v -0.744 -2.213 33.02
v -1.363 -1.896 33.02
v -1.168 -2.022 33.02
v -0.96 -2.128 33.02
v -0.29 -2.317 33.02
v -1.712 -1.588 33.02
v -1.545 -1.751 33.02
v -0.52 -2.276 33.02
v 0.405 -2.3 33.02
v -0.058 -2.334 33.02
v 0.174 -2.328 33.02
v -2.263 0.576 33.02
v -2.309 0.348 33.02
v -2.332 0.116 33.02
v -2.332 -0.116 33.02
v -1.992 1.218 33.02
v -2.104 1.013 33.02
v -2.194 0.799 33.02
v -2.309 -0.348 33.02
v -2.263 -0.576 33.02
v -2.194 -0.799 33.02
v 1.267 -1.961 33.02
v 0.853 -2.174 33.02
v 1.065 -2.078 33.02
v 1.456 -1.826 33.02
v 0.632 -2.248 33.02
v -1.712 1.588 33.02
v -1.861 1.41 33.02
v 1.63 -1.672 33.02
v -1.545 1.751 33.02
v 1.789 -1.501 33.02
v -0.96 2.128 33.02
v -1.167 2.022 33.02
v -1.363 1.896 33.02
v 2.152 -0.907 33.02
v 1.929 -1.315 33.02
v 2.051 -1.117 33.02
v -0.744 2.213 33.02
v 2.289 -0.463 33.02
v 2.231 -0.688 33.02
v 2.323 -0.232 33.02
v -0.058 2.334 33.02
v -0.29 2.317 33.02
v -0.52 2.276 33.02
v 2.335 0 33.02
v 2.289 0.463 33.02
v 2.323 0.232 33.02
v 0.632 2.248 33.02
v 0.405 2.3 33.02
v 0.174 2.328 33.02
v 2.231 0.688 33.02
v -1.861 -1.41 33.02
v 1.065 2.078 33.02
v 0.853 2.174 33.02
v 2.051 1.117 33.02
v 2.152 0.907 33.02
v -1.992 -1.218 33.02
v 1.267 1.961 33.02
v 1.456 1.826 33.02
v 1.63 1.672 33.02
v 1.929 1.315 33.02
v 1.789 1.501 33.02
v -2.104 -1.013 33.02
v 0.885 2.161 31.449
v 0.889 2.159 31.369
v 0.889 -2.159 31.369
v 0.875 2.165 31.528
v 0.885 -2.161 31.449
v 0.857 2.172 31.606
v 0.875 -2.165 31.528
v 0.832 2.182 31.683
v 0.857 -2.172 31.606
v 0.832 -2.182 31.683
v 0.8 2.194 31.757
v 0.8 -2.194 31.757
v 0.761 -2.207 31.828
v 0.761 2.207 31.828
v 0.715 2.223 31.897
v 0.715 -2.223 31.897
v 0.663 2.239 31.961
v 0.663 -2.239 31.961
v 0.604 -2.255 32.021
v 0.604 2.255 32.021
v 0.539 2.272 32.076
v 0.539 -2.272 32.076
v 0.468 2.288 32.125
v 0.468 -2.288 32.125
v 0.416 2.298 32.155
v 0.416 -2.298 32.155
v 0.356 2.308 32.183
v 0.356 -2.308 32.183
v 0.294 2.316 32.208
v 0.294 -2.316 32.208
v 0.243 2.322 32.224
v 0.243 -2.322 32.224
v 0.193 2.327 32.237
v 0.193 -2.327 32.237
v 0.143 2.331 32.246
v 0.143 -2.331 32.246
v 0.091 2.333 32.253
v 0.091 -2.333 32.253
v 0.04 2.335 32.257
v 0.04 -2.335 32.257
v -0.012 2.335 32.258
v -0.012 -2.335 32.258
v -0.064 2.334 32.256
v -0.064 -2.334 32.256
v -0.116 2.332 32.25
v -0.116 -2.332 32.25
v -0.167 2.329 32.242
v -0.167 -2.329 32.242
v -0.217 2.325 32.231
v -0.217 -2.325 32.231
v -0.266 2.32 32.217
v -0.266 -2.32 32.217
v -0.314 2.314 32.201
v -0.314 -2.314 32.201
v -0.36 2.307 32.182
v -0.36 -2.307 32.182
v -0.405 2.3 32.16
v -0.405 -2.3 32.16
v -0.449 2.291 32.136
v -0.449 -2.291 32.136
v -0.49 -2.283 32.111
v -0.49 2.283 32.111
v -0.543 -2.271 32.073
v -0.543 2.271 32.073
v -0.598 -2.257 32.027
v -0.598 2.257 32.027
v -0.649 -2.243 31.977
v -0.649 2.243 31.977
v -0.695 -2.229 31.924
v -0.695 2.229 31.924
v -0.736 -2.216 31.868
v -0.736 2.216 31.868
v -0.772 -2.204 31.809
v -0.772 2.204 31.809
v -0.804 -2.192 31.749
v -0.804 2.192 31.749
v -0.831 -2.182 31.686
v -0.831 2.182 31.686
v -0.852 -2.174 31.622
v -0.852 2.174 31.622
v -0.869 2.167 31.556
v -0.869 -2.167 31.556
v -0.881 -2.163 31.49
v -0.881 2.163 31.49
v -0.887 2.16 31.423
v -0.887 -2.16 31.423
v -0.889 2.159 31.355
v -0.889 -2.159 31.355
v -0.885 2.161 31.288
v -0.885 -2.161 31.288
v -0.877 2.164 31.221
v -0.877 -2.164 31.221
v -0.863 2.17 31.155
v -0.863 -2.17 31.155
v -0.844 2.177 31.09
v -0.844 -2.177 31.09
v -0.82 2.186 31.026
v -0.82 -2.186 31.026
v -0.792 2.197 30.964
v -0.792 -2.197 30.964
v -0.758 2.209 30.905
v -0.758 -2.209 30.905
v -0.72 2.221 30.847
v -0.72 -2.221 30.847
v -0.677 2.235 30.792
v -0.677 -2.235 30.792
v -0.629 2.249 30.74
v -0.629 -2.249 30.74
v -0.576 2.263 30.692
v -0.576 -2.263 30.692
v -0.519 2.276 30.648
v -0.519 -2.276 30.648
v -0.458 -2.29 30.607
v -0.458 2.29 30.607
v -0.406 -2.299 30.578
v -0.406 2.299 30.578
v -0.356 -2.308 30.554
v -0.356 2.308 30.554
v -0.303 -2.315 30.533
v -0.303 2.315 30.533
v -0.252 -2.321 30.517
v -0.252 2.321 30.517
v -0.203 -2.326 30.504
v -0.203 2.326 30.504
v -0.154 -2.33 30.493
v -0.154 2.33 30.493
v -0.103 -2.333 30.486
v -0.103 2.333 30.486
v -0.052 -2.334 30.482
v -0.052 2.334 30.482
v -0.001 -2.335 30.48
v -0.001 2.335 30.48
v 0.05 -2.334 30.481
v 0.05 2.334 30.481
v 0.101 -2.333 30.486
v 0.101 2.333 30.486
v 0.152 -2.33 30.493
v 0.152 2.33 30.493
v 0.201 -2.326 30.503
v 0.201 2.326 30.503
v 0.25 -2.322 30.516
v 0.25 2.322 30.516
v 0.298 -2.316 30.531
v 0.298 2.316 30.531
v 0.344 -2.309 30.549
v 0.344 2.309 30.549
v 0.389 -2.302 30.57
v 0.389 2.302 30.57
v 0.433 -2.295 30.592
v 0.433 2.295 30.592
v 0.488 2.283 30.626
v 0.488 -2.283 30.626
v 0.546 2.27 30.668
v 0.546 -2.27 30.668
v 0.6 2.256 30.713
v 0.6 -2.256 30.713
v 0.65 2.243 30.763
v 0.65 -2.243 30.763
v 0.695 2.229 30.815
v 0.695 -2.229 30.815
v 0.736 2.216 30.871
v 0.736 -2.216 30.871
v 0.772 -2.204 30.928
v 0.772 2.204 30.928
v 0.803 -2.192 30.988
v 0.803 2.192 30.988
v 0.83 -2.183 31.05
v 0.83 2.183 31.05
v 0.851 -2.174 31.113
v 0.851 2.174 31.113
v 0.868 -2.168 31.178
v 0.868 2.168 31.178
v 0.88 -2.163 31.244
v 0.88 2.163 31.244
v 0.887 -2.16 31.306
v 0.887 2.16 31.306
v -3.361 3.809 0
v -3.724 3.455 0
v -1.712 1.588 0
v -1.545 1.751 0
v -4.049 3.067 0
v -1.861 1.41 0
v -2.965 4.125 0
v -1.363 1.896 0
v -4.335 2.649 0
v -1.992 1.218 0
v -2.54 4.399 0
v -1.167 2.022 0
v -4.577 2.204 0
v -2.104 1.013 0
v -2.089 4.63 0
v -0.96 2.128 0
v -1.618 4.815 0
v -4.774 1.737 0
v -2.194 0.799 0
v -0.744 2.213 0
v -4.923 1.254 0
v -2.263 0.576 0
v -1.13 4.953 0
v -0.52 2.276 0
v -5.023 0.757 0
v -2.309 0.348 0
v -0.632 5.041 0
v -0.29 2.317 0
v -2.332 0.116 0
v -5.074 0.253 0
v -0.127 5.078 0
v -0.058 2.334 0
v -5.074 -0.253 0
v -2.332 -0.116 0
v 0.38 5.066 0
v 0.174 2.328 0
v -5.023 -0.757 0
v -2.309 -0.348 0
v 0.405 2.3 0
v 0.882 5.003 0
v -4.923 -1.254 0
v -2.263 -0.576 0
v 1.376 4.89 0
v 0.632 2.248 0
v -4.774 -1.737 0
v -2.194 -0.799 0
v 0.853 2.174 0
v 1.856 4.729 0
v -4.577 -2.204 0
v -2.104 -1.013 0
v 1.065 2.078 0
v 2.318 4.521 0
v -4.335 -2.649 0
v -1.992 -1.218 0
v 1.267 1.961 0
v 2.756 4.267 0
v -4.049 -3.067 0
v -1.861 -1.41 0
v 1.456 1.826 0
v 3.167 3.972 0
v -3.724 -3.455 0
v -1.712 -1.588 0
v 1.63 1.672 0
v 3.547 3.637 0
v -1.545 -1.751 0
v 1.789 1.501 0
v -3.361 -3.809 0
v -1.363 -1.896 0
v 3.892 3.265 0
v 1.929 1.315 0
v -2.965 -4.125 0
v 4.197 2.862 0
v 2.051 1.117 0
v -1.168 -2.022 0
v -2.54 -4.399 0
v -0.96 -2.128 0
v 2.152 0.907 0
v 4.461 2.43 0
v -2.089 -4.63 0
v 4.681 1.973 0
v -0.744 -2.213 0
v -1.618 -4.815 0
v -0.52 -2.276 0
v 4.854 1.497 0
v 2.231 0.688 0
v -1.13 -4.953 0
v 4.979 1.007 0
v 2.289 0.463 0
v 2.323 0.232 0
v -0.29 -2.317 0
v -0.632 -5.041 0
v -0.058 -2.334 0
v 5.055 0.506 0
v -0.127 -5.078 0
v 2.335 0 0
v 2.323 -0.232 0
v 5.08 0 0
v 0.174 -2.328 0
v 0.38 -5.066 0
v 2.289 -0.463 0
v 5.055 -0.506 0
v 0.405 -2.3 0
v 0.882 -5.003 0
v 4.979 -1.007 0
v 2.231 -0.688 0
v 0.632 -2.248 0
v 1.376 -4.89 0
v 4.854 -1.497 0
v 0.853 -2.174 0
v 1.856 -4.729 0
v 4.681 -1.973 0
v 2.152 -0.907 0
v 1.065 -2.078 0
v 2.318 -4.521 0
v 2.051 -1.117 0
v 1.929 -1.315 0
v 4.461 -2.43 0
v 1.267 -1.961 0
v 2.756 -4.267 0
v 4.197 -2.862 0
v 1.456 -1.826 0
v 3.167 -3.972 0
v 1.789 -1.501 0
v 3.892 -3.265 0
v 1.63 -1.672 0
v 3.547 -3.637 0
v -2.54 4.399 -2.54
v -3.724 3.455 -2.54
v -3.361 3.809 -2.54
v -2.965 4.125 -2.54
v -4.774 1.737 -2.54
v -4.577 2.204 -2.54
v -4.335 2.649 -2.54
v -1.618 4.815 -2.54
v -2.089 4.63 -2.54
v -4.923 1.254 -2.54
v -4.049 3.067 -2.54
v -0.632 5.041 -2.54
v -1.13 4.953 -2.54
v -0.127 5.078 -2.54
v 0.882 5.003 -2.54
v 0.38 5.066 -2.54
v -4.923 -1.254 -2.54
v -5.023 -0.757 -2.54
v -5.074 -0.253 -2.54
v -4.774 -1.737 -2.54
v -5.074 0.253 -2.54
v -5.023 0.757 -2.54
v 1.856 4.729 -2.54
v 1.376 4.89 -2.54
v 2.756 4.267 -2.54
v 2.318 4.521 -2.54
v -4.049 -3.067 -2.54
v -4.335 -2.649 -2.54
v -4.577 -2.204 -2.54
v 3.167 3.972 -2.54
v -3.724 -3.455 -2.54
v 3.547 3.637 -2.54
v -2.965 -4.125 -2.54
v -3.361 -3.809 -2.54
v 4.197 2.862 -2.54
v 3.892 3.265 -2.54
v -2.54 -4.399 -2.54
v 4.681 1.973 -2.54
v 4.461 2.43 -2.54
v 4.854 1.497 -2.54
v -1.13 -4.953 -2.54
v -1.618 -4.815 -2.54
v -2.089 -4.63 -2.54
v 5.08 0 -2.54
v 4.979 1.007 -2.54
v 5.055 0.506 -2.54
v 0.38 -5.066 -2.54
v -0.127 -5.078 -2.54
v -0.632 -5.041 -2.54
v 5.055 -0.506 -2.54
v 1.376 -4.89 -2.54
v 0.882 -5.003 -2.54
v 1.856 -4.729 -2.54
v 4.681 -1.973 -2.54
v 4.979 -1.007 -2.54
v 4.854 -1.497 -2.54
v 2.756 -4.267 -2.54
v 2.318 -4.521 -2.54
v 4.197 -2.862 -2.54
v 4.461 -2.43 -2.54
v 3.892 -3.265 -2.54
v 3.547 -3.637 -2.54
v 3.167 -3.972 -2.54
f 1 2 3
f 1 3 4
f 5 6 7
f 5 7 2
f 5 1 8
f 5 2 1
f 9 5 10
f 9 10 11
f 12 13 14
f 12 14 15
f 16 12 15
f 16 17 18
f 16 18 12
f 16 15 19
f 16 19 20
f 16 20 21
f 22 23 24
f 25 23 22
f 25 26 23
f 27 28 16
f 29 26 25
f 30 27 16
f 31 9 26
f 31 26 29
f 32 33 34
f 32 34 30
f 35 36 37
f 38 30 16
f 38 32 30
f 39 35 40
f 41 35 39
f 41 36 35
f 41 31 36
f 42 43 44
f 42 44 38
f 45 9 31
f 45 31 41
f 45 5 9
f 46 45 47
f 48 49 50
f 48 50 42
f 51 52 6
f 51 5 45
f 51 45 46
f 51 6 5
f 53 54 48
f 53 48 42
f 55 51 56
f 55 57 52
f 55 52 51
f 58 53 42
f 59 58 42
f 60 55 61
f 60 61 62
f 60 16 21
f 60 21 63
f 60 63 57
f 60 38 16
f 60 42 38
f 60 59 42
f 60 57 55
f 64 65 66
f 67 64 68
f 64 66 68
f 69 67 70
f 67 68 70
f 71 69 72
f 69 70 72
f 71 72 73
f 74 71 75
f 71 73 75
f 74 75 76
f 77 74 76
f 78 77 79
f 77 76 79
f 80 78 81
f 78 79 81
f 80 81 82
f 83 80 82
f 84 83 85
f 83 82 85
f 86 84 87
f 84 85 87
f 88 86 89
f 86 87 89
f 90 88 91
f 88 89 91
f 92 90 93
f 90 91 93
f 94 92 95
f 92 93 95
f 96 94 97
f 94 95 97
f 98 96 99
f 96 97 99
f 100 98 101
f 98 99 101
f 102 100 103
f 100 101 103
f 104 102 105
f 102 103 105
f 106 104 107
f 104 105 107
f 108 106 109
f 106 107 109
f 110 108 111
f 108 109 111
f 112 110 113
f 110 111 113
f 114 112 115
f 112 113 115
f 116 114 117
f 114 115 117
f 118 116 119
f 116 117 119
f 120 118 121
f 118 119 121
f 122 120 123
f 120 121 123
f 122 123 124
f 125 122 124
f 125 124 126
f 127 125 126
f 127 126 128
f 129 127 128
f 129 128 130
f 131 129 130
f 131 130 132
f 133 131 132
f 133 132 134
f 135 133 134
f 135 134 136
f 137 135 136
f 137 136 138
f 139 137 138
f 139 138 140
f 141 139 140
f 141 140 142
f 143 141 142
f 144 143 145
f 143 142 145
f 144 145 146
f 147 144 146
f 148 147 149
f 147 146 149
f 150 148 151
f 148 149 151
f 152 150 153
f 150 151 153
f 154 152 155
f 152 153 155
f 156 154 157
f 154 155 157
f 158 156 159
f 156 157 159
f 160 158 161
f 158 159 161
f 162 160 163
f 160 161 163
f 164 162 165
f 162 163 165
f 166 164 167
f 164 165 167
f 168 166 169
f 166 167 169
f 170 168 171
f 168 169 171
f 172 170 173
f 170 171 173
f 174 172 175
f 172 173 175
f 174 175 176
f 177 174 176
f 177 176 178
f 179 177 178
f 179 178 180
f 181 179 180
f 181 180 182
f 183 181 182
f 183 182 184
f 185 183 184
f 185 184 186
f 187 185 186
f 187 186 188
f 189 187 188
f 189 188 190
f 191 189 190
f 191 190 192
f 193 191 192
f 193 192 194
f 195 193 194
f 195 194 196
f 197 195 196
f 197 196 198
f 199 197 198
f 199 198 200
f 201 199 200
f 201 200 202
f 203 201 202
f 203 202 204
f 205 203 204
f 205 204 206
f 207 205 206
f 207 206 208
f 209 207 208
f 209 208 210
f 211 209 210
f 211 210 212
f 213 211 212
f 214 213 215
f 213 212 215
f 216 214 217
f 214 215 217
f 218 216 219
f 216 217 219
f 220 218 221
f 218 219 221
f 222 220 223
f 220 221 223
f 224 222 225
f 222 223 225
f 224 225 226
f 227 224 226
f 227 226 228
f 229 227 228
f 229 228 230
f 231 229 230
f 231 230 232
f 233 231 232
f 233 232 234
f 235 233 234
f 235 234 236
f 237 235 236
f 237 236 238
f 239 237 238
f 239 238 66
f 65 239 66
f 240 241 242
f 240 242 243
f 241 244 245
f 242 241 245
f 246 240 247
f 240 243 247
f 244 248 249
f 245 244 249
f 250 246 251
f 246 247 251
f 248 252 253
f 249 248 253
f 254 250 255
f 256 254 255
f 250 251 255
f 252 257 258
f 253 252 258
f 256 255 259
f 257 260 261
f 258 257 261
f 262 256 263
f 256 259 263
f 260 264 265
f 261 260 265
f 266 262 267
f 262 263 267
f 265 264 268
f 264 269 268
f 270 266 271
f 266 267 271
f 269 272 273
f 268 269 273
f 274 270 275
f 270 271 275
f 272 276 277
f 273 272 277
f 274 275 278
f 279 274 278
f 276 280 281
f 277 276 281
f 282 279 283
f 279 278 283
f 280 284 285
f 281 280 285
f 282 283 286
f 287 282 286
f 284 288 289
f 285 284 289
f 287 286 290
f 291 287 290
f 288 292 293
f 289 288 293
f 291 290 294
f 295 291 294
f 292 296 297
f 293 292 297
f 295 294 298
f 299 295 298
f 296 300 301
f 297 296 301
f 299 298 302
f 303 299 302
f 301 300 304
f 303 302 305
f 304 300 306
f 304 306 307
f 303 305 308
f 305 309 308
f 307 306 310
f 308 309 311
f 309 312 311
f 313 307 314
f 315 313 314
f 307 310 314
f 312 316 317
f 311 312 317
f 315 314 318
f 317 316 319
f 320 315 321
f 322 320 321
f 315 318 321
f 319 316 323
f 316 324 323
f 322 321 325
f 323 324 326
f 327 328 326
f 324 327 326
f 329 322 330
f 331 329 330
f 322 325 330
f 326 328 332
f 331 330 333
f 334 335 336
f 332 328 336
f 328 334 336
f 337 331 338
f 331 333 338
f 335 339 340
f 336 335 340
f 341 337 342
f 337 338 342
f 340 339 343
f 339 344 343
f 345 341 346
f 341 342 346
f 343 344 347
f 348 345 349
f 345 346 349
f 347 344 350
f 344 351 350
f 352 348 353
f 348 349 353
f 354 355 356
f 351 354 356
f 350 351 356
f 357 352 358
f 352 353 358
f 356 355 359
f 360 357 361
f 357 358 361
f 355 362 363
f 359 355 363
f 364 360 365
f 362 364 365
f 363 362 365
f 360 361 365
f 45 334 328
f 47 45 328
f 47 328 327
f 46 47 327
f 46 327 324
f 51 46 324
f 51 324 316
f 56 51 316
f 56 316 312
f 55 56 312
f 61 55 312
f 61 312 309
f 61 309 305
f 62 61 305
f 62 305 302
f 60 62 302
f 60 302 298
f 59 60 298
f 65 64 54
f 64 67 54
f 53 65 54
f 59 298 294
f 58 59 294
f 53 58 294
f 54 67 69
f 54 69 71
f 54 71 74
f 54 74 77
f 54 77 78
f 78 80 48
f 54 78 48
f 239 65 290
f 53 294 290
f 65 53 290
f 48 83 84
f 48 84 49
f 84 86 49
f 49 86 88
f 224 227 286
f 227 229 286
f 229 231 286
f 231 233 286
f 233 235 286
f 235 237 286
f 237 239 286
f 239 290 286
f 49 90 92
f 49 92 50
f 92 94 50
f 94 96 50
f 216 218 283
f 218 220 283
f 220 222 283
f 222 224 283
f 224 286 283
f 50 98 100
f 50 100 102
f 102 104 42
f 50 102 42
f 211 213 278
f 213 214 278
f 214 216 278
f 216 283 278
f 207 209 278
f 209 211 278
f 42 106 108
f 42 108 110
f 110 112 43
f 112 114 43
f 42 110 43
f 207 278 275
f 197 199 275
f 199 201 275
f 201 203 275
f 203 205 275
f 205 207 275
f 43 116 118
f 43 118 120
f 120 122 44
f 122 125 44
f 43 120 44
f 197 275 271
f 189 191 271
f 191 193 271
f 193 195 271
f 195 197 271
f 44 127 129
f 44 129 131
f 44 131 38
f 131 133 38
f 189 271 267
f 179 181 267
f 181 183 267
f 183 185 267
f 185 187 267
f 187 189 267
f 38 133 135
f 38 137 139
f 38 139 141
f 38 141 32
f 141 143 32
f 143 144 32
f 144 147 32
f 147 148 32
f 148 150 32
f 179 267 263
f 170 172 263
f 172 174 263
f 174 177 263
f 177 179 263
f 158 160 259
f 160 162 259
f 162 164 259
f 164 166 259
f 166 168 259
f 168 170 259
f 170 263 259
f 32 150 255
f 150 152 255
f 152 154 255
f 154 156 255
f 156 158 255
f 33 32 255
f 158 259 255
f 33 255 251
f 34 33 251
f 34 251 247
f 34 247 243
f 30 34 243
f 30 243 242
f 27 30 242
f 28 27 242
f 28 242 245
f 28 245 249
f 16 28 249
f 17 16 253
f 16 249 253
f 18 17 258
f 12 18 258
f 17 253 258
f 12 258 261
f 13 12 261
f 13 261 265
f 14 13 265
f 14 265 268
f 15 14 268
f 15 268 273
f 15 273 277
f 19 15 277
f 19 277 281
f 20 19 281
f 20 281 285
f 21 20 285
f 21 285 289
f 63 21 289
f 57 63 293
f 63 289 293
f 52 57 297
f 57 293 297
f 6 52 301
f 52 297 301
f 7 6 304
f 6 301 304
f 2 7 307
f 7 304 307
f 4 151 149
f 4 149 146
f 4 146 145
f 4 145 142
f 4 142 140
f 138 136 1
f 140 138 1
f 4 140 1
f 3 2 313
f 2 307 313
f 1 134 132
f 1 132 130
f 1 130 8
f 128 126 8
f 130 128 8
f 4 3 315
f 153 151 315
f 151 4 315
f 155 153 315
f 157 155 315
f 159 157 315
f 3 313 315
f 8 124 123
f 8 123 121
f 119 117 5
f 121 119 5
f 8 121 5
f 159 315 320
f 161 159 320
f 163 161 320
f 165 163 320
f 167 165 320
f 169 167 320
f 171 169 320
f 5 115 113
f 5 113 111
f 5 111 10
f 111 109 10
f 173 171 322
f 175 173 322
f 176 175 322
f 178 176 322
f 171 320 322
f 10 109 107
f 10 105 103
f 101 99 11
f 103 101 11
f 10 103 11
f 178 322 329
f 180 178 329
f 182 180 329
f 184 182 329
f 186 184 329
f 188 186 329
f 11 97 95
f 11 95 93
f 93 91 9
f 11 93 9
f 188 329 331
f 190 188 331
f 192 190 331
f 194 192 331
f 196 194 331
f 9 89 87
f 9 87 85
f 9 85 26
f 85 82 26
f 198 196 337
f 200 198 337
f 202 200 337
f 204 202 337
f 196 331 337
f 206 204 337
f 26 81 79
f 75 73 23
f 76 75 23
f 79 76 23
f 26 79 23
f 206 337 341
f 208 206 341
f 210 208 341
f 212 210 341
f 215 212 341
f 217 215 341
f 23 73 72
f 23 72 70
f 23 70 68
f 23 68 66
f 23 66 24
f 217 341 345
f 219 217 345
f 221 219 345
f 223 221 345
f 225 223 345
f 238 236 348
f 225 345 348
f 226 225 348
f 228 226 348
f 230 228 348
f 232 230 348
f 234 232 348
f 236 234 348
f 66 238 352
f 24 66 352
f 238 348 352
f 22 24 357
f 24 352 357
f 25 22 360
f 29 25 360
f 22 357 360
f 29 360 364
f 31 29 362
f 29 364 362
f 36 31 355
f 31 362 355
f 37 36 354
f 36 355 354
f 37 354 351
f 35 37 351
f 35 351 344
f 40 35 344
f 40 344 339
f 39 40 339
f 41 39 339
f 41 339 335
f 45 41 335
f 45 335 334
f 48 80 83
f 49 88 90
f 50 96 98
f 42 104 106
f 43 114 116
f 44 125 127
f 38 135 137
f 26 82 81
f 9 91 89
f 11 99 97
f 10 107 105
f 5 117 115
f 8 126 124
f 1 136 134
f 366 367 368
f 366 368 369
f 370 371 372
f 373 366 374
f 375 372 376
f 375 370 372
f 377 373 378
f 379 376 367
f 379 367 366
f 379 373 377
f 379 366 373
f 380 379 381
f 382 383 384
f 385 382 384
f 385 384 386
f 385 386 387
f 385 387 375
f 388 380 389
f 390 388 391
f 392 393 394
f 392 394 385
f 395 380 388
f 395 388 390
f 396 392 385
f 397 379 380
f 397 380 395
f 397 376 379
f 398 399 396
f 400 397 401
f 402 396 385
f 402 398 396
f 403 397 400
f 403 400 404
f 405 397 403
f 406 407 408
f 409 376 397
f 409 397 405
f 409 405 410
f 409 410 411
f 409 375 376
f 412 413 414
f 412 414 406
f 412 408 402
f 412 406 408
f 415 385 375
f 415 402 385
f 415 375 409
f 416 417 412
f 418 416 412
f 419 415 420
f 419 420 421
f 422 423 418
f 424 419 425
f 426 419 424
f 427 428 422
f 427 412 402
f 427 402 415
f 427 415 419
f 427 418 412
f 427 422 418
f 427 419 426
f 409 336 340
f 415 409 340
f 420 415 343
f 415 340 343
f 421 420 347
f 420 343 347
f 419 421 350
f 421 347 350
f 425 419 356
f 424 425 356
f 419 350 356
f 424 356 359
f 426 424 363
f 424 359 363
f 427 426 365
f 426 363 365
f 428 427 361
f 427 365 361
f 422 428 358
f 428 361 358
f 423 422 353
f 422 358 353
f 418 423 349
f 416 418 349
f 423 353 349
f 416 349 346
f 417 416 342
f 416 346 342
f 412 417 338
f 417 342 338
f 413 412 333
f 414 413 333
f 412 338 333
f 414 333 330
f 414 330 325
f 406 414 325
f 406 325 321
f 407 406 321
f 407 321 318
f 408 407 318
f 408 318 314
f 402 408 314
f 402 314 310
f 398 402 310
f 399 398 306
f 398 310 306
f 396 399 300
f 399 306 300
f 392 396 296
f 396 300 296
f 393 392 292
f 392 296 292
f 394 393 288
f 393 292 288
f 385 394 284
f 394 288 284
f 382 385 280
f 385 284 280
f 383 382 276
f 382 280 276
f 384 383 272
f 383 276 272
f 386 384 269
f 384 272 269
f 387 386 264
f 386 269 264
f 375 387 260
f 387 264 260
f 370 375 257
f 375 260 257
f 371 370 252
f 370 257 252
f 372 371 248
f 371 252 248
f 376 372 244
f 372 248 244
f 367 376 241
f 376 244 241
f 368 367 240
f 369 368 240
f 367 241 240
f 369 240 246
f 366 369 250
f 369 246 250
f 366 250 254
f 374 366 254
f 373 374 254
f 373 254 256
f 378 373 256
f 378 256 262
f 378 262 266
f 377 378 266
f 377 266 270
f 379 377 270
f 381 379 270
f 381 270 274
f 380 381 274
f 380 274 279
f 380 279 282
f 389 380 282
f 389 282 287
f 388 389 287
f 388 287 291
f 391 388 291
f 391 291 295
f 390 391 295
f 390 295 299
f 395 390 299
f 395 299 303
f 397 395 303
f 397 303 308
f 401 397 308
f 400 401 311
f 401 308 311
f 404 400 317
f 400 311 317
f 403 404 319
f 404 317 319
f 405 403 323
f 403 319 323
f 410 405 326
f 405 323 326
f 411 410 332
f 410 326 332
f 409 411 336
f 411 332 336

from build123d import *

# Parameters (mm, degrees)
F0_R     = 2.335
F1_DEPTH = 33.02
F2_R     = 5.08
F2_R_2   = 2.335
F3_DEPTH = 2.54
F4_R     = 0.889
F5_DEPTH = 12.7


with BuildPart() as f1:
    # F0 (on Top) → F1 (new body)
    with BuildSketch(Plane.XY):
        Circle(F0_R)
    extrude(amount=F1_DEPTH)

    # F2 (on face) → F3 (join)
    with BuildSketch(Plane(origin=(0, 0, 0), x_dir=(1, 0, 0), z_dir=(0, 0, -1))):
        Circle(F2_R)
        Circle(F2_R_2, mode=Mode.SUBTRACT)
        Circle(F2_R_2)
    extrude(amount=F3_DEPTH)

    # F4 (on Front) → F5 (cut, symmetric)
    with BuildSketch(Plane.XZ):
        with Locations((0, 31.369)):
            Circle(F4_R)
    extrude(amount=F5_DEPTH, both=True, mode=Mode.SUBTRACT)


solid = f1.part
